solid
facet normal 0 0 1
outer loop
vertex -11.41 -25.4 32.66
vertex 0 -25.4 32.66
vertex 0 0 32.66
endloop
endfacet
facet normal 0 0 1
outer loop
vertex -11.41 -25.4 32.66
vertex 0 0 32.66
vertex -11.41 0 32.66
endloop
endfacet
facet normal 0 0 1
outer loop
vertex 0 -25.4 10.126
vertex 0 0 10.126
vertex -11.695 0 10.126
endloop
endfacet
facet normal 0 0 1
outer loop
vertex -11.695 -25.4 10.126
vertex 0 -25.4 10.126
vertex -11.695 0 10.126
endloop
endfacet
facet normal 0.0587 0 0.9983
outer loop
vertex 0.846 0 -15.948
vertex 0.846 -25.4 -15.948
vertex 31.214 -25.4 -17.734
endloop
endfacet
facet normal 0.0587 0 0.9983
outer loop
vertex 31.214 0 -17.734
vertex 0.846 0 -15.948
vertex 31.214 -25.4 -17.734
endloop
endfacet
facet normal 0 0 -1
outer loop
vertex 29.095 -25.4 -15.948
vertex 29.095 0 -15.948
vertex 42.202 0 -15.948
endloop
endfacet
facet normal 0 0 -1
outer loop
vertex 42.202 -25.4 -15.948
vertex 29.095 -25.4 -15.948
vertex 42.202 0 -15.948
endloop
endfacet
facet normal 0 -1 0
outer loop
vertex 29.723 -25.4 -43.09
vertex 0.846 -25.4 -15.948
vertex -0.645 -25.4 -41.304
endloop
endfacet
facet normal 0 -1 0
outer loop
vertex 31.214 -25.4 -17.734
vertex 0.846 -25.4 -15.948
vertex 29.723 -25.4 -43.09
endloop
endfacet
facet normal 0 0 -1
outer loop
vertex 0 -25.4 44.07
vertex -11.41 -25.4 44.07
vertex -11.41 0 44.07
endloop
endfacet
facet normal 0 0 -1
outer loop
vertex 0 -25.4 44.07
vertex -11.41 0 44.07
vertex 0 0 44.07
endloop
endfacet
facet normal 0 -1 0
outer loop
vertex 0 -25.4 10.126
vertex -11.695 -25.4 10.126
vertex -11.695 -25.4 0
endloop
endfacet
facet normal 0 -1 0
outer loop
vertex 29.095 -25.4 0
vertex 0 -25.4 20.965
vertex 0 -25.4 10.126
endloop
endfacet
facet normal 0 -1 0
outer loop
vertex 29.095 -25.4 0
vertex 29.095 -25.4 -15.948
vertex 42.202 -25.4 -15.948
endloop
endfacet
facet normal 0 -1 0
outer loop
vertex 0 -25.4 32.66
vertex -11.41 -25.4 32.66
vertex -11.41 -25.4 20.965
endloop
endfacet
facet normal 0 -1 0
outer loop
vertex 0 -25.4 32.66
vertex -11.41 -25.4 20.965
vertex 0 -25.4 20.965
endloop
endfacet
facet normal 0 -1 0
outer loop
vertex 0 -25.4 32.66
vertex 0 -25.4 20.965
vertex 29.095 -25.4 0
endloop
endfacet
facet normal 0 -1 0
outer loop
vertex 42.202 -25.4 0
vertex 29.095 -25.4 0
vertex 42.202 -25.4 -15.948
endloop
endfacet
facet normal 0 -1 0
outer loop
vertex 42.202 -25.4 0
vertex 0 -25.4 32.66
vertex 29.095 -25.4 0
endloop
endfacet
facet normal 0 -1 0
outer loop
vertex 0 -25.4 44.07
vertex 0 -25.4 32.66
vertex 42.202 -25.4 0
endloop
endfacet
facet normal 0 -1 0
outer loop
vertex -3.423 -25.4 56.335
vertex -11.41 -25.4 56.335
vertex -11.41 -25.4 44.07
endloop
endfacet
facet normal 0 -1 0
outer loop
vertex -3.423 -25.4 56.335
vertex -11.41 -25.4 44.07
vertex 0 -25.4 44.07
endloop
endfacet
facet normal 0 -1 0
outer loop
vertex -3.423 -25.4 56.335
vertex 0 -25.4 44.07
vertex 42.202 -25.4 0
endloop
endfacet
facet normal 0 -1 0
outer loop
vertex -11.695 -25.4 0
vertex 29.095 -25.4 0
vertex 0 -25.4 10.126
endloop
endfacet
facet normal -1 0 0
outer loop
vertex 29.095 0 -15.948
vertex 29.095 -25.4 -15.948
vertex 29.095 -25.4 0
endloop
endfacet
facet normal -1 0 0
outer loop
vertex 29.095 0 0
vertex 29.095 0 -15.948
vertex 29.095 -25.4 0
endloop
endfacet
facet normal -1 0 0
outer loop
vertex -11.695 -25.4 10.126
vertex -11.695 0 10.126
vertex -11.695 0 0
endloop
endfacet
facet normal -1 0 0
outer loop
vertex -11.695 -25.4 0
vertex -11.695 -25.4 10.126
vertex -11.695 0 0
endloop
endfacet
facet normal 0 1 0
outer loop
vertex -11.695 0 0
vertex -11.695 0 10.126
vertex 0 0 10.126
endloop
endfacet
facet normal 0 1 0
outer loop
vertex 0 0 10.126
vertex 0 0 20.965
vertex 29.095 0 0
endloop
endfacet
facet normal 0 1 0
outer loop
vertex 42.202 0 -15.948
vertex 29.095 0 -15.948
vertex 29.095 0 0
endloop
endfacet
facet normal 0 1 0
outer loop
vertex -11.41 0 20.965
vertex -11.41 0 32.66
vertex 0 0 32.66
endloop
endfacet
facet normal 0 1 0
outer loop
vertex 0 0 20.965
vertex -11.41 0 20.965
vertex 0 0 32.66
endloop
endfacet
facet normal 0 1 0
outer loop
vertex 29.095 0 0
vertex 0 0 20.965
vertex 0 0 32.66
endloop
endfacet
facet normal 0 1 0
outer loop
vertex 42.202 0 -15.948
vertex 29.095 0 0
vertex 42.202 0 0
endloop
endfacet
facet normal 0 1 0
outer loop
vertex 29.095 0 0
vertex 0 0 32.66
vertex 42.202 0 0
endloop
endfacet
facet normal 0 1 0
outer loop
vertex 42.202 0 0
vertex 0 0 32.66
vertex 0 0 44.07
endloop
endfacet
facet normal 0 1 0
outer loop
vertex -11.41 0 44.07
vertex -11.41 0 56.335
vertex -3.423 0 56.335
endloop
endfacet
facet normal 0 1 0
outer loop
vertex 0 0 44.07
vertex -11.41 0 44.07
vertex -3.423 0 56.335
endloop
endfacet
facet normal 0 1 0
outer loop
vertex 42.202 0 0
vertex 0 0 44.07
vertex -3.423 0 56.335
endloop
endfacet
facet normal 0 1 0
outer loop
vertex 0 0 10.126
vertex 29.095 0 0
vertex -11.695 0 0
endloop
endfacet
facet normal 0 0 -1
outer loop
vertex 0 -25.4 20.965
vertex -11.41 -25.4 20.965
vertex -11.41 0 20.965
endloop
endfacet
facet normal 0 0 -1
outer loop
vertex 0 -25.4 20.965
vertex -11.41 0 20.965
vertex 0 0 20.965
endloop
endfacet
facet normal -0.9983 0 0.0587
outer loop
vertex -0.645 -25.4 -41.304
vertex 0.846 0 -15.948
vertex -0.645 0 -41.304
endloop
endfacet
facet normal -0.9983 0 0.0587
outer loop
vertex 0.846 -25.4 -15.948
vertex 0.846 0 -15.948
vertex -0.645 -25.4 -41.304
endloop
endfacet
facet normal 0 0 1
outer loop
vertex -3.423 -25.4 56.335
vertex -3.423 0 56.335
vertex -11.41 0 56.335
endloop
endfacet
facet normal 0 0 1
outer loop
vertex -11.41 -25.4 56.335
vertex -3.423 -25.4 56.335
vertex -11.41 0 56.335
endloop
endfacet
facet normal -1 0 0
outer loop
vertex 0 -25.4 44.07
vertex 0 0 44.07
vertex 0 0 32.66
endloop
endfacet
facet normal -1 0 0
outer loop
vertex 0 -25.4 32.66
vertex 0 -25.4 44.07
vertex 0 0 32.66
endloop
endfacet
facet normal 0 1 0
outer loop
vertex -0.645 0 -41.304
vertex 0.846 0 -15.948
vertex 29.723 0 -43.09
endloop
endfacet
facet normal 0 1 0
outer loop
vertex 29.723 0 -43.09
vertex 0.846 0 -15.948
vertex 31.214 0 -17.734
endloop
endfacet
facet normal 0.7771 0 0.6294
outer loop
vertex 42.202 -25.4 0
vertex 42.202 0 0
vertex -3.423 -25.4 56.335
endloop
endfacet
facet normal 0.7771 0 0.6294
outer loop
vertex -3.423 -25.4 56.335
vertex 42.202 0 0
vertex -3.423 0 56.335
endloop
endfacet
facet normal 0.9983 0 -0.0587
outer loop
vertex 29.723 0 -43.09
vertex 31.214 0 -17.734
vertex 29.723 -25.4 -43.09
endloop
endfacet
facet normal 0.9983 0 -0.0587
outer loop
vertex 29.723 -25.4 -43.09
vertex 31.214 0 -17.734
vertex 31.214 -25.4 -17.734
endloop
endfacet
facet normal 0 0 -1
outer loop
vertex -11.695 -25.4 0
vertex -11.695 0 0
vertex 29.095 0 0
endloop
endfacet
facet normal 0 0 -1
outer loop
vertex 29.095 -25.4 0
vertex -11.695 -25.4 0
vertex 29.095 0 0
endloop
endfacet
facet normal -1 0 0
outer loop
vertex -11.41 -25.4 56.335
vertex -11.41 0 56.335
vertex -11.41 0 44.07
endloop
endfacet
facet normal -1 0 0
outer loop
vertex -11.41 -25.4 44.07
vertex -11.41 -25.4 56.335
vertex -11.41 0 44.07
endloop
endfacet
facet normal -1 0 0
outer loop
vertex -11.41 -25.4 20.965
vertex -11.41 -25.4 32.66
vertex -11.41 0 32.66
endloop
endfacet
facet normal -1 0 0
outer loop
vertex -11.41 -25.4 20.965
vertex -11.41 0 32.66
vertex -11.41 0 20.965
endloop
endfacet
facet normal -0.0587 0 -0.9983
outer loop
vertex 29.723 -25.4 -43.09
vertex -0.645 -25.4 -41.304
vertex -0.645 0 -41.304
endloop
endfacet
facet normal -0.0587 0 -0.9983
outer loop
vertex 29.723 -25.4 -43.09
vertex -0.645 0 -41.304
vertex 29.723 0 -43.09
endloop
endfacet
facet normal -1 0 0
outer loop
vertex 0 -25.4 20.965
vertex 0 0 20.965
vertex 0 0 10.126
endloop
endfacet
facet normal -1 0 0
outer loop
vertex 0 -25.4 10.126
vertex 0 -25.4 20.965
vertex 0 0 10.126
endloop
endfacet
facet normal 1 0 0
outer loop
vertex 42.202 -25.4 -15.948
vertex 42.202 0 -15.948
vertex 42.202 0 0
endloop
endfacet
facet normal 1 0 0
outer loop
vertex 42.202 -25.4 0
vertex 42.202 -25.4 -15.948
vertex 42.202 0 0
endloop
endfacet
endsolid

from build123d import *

# Parameters (mm, degrees)
F0_W     = 13.1069884534
F0_H     = 15.9477586227
F2_DEPTH = 25.4
F1_E23_W = 30.420306172
F1_E23_H = 25.4
F3_DEPTH = 25.4


with BuildPart() as f2:
    # F0 (on Front) → F2 (new body)
    with BuildSketch(Plane.XZ):
        Polygon((-3.4228879958, 56.3350282609), (-11.4096244797, 56.3350282609), (-11.4096244797, 44.0696775913), (0, 44.0696775913), (0, 32.6600521803), (-11.4096244797, 32.6600521803), (-11.4096244797, 20.9651887417), (0, 20.9651887417), (0, 10.1260431111), (-11.6948653013, 10.1260431111), (-11.6948653013, 0), (29.094543308, 0), (42.2015317614, 0), align=None)
        with Locations((35.6480375347, -7.9738793114)):
            Rectangle(F0_W, F0_H)
    extrude(amount=F2_DEPTH)


with BuildPart() as f3:
    # F1_E23 (on explicit) → F3 (new body)
    with BuildSketch(Plane(origin=(0.8463693679, 0, -15.9477586227), x_dir=(0.9982743725, 0, -0.0587220332), z_dir=(-0.0587220332, 0, -0.9982743725))):
        with Locations((15.210153086, 12.7)):
            Rectangle(F1_E23_W, F1_E23_H)
    extrude(amount=F3_DEPTH)


solid = Compound([f2.part, f3.part])
